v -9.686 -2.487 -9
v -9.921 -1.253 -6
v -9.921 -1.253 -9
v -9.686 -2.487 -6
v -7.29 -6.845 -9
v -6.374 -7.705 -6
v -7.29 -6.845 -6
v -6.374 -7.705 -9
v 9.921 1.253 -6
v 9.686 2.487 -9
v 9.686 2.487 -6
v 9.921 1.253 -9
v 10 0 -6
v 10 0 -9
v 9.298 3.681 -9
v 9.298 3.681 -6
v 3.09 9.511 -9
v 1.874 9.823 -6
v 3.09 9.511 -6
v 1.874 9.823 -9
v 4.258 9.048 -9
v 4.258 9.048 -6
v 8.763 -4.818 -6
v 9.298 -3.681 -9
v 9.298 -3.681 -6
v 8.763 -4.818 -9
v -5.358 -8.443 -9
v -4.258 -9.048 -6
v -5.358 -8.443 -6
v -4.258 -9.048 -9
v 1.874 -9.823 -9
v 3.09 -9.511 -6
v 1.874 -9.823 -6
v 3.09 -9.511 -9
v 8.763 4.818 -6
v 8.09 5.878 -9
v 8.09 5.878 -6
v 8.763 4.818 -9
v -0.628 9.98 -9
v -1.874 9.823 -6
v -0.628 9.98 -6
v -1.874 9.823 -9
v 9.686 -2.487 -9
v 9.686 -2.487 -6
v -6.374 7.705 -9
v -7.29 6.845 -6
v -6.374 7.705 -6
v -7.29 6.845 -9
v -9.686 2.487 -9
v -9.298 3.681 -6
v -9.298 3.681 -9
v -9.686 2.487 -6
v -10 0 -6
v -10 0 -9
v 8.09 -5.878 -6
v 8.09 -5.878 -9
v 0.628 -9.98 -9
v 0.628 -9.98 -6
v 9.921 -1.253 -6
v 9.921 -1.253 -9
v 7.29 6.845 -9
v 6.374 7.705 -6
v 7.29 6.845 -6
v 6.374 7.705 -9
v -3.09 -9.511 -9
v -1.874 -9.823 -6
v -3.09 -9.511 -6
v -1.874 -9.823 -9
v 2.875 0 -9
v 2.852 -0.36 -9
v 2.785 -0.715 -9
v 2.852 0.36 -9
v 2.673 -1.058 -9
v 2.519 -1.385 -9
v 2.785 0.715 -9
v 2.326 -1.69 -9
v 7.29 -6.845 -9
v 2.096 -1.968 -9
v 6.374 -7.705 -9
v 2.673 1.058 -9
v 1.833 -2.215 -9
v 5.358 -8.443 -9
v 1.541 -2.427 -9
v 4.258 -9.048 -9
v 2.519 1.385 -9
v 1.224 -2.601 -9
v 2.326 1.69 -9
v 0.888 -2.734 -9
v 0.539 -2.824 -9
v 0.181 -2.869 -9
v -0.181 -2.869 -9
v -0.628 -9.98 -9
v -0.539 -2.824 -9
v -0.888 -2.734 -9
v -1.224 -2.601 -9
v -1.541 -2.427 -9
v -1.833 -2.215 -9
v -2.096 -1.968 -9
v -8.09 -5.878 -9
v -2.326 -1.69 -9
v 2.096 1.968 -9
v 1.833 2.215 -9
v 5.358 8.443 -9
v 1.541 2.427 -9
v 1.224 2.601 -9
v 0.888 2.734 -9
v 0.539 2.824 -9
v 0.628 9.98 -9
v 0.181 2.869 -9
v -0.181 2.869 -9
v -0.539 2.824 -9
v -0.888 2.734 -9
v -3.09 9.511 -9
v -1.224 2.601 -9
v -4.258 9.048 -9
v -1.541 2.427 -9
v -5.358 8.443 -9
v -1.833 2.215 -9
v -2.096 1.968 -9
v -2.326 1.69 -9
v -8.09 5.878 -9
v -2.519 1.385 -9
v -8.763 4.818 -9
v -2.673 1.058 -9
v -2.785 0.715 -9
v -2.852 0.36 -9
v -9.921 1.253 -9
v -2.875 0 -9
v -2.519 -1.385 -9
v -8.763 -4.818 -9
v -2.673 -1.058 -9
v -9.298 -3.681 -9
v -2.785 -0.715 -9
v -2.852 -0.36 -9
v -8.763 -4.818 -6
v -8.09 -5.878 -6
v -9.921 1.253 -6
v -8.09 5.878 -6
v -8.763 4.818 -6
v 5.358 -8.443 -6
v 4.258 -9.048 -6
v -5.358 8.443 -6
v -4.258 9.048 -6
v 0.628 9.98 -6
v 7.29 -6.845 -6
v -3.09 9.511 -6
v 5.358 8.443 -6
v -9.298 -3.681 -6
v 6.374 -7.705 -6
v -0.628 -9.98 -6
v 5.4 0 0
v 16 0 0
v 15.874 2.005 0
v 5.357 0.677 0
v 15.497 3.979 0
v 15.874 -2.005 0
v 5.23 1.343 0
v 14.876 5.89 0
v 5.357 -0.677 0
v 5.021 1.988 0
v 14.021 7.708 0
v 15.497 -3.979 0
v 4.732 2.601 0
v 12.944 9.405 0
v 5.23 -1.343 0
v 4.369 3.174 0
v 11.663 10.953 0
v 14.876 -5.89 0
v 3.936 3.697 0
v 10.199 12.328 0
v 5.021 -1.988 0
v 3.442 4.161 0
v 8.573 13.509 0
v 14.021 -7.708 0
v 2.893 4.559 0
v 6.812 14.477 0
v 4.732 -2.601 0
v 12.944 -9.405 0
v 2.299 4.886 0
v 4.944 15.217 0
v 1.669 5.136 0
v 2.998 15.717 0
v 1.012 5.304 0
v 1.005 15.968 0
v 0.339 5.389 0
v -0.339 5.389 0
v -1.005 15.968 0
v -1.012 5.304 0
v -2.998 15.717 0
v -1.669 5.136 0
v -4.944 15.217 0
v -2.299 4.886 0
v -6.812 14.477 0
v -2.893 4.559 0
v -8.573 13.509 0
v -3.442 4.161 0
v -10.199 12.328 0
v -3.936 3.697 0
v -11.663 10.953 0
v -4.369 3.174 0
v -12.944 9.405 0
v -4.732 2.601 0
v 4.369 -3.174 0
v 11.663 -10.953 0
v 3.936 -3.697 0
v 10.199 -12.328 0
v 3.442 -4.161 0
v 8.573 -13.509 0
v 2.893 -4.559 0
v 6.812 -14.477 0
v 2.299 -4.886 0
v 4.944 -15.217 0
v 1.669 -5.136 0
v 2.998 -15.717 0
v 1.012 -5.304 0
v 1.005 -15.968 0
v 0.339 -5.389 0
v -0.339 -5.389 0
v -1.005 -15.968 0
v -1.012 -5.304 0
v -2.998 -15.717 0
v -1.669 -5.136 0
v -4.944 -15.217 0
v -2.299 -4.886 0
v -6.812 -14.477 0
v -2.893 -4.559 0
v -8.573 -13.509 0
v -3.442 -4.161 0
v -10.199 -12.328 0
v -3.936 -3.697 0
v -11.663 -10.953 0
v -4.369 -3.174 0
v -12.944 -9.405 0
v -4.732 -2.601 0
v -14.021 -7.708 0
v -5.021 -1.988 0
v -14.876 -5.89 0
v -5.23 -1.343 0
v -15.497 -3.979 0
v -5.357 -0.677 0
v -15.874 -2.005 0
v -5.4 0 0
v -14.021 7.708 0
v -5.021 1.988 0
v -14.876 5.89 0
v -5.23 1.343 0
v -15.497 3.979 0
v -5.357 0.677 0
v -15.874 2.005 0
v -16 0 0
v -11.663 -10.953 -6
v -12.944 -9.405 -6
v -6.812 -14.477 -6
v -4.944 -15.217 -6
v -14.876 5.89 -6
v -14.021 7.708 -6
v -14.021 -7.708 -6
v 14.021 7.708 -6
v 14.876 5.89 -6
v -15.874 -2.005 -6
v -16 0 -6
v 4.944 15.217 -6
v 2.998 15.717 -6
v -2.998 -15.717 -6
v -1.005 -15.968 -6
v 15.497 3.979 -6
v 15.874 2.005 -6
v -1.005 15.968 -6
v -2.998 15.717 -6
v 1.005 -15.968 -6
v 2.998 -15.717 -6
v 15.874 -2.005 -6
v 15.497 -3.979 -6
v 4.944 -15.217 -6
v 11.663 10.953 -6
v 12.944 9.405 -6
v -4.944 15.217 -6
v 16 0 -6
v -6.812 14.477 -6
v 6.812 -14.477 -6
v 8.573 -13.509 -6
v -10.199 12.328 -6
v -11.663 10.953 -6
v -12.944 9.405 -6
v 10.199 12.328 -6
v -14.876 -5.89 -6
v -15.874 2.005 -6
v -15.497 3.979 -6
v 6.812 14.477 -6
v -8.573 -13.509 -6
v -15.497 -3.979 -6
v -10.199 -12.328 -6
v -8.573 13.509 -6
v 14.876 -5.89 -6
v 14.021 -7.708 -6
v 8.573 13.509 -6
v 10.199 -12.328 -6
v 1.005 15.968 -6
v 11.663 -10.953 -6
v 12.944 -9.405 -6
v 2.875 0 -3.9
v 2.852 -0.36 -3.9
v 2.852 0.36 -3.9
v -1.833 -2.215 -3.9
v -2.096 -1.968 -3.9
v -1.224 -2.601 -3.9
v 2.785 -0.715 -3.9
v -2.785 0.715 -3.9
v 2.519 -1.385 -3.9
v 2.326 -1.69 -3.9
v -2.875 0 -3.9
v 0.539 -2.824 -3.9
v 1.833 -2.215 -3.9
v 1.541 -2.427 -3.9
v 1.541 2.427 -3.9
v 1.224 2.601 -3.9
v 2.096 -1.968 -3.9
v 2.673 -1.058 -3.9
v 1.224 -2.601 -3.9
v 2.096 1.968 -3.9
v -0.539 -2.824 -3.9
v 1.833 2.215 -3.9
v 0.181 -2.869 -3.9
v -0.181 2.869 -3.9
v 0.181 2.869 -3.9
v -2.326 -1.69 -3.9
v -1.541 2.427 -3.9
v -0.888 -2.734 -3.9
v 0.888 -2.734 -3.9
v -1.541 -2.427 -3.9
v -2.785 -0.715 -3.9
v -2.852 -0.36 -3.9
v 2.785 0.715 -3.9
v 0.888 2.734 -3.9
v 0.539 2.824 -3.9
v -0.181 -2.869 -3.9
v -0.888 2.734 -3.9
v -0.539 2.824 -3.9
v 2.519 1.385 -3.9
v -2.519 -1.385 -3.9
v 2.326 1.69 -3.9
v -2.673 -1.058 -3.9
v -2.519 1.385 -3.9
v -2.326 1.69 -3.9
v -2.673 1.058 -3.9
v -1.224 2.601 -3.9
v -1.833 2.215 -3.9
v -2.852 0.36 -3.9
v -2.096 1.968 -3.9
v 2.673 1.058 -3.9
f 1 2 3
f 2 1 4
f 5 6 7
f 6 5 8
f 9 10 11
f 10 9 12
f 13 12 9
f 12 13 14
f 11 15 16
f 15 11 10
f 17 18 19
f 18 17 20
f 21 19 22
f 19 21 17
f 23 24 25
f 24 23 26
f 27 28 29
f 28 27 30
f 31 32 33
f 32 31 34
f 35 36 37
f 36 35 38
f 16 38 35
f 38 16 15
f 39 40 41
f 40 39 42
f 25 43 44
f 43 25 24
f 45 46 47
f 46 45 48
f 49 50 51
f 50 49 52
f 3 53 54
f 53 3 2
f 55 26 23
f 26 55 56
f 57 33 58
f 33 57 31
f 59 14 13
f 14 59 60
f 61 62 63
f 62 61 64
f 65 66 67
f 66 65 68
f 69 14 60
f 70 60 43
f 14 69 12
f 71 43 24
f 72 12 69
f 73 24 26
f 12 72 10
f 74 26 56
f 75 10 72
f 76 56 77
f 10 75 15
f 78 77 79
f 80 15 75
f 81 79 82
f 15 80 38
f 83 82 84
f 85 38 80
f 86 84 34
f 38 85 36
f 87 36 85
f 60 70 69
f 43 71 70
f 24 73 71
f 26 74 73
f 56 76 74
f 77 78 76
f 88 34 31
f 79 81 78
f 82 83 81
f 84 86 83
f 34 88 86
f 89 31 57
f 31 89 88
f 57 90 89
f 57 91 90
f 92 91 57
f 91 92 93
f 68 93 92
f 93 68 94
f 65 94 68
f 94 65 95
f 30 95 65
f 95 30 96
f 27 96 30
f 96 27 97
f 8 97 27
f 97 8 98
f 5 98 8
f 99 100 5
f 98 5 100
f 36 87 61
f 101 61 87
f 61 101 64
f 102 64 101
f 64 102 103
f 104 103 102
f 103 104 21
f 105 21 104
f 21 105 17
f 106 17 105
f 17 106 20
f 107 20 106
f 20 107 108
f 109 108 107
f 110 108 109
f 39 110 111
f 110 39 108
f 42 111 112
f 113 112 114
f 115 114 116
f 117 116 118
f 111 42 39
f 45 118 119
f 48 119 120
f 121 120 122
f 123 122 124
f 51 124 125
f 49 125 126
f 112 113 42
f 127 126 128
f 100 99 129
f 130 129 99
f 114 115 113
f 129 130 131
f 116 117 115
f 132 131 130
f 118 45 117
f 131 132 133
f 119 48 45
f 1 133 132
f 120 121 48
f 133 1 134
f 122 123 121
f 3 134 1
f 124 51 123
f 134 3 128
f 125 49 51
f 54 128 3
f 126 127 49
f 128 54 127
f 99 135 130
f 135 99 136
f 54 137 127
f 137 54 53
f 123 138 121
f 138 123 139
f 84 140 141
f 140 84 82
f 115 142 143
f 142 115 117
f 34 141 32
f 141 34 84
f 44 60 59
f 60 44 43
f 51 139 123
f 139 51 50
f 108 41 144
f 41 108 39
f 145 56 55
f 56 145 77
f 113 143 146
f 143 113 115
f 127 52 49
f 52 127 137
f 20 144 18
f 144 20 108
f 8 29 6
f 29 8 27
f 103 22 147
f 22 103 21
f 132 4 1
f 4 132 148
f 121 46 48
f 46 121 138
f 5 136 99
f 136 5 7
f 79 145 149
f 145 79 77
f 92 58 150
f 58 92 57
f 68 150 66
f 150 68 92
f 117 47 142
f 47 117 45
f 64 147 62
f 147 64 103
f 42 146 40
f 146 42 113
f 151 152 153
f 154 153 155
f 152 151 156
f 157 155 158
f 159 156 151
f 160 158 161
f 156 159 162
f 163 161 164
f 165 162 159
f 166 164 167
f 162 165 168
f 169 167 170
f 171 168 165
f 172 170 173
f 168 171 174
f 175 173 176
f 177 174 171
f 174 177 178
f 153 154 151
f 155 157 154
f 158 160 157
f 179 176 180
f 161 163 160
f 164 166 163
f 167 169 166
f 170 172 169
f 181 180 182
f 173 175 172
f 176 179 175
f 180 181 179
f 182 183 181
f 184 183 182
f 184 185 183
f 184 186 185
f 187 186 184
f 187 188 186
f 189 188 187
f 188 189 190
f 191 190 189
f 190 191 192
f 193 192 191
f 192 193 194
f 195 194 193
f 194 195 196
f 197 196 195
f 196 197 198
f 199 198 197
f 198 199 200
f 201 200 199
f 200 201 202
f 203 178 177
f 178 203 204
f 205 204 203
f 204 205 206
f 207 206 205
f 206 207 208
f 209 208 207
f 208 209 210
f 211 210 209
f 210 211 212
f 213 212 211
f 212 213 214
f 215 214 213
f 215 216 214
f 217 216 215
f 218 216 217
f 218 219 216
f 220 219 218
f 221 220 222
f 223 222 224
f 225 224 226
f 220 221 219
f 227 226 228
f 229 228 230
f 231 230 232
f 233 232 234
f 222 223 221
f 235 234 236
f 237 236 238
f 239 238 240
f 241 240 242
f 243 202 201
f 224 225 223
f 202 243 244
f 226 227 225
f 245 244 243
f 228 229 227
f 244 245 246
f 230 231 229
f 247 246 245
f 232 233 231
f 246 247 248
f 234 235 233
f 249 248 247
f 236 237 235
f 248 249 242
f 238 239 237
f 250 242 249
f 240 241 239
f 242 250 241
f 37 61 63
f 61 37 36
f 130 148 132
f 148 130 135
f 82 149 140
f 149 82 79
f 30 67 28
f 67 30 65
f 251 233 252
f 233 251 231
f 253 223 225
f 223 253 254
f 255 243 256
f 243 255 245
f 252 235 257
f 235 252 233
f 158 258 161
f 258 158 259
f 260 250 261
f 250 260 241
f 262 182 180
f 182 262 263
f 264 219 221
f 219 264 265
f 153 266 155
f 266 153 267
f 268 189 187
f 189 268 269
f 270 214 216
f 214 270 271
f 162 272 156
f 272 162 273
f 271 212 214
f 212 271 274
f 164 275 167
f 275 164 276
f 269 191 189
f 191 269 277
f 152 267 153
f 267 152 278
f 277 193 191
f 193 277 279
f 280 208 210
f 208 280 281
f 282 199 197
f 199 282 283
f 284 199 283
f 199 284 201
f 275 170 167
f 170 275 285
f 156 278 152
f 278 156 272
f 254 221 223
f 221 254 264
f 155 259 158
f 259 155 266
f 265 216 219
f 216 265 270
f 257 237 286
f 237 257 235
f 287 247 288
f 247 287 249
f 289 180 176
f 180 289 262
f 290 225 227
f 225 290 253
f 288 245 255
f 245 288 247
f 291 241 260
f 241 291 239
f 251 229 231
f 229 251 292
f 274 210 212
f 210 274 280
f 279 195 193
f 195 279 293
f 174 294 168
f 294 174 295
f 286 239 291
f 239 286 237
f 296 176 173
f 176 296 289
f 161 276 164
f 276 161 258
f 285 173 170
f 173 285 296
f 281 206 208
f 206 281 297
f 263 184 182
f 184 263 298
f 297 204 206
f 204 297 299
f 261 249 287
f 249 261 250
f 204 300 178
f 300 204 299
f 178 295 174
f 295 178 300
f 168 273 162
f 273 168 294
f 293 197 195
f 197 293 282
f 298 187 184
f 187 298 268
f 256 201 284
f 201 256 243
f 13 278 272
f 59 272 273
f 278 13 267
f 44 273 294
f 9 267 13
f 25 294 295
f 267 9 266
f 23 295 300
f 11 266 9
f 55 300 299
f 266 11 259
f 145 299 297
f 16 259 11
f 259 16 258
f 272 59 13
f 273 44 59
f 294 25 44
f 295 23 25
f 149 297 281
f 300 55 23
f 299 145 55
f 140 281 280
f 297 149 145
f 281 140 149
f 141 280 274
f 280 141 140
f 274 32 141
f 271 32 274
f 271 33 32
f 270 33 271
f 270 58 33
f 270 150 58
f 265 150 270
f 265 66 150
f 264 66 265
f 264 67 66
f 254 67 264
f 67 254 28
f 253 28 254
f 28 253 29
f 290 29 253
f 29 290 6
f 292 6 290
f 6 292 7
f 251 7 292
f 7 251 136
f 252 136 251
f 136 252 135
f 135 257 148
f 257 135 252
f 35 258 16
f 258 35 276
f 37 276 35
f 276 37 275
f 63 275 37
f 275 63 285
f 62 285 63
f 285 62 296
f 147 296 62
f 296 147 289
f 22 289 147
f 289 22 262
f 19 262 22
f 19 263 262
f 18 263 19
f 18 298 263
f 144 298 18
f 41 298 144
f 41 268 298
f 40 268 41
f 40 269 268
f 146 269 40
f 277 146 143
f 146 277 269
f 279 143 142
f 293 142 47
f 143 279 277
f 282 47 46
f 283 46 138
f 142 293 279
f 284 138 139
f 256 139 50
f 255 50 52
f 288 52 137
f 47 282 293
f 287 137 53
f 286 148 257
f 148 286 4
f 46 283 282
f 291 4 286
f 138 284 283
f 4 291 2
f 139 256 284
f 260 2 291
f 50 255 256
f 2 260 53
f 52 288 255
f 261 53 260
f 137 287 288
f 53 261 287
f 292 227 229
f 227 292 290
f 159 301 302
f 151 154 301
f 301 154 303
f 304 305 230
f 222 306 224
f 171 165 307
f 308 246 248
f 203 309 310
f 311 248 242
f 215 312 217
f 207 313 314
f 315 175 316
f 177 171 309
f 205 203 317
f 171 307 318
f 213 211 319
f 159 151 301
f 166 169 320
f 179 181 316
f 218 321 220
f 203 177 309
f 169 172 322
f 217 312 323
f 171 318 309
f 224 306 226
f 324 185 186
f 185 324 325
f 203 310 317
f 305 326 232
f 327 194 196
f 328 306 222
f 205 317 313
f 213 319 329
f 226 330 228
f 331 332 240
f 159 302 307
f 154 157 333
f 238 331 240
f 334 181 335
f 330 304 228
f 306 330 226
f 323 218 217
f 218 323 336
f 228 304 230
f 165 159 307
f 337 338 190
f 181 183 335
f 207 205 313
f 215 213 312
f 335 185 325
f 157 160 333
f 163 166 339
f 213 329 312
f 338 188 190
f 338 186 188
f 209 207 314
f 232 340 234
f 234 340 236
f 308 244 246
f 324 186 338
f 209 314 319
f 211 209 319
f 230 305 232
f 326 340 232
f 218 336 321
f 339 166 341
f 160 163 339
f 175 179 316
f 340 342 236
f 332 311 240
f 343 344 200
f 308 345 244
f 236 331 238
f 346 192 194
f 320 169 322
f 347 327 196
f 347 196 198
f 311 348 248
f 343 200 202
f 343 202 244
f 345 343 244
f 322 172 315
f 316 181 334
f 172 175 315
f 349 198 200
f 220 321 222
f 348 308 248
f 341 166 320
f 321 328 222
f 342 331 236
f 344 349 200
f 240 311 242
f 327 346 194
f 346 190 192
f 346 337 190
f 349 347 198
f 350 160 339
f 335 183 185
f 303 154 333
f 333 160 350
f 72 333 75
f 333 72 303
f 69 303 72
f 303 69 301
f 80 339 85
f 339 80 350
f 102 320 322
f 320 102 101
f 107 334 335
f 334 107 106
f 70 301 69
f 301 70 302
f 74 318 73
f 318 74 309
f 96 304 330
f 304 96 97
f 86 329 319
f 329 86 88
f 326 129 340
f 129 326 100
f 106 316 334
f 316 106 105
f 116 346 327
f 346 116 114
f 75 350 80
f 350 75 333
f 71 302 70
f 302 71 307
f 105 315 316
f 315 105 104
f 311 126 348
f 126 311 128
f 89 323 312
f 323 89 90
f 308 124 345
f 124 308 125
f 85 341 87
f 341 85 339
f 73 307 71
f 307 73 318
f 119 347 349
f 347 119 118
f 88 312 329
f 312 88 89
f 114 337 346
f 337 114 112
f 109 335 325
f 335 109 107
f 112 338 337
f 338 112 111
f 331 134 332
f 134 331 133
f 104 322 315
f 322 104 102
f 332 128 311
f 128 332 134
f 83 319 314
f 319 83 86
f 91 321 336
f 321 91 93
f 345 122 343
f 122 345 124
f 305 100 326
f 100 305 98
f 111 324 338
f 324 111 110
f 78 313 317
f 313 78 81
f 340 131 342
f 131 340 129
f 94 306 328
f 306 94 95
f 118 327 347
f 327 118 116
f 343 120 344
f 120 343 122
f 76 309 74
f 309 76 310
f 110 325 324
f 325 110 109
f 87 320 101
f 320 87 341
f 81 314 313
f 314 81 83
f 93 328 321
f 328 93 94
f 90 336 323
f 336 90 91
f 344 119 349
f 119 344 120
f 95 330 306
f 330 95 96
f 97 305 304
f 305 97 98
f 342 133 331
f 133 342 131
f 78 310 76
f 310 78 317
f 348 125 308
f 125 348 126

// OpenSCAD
$fn = 50;


difference() {
	union() {
		translate(v = [0, 0, -9.0000000000]) {
			cylinder(h = 9, r = 10.0000000000);
		}
		translate(v = [0, 0, -6.0000000000]) {
			cylinder(h = 6, r = 16.0000000000);
		}
	}
	union() {
		translate(v = [0, 0, 0]) {
			rotate(a = [0, 0, 0]) {
				difference() {
					union() {
						#translate(v = [0, 0, -9.0000000000]) {
							cylinder(h = 9, r = 2.6000000000);
						}
						#translate(v = [0, 0, -3.9000000000]) {
							cylinder(h = 3.9000000000, r = 10.0000000000, r1 = 2.8750000000, r2 = 5.4000000000);
						}
						#translate(v = [0, 0, -9.0000000000]) {
							cylinder(h = 9, r = 2.8750000000);
						}
						#translate(v = [0, 0, -9.0000000000]) {
							cylinder(h = 9, r = 2.6000000000);
						}
					}
					union();
				}
			}
		}
	}
}
